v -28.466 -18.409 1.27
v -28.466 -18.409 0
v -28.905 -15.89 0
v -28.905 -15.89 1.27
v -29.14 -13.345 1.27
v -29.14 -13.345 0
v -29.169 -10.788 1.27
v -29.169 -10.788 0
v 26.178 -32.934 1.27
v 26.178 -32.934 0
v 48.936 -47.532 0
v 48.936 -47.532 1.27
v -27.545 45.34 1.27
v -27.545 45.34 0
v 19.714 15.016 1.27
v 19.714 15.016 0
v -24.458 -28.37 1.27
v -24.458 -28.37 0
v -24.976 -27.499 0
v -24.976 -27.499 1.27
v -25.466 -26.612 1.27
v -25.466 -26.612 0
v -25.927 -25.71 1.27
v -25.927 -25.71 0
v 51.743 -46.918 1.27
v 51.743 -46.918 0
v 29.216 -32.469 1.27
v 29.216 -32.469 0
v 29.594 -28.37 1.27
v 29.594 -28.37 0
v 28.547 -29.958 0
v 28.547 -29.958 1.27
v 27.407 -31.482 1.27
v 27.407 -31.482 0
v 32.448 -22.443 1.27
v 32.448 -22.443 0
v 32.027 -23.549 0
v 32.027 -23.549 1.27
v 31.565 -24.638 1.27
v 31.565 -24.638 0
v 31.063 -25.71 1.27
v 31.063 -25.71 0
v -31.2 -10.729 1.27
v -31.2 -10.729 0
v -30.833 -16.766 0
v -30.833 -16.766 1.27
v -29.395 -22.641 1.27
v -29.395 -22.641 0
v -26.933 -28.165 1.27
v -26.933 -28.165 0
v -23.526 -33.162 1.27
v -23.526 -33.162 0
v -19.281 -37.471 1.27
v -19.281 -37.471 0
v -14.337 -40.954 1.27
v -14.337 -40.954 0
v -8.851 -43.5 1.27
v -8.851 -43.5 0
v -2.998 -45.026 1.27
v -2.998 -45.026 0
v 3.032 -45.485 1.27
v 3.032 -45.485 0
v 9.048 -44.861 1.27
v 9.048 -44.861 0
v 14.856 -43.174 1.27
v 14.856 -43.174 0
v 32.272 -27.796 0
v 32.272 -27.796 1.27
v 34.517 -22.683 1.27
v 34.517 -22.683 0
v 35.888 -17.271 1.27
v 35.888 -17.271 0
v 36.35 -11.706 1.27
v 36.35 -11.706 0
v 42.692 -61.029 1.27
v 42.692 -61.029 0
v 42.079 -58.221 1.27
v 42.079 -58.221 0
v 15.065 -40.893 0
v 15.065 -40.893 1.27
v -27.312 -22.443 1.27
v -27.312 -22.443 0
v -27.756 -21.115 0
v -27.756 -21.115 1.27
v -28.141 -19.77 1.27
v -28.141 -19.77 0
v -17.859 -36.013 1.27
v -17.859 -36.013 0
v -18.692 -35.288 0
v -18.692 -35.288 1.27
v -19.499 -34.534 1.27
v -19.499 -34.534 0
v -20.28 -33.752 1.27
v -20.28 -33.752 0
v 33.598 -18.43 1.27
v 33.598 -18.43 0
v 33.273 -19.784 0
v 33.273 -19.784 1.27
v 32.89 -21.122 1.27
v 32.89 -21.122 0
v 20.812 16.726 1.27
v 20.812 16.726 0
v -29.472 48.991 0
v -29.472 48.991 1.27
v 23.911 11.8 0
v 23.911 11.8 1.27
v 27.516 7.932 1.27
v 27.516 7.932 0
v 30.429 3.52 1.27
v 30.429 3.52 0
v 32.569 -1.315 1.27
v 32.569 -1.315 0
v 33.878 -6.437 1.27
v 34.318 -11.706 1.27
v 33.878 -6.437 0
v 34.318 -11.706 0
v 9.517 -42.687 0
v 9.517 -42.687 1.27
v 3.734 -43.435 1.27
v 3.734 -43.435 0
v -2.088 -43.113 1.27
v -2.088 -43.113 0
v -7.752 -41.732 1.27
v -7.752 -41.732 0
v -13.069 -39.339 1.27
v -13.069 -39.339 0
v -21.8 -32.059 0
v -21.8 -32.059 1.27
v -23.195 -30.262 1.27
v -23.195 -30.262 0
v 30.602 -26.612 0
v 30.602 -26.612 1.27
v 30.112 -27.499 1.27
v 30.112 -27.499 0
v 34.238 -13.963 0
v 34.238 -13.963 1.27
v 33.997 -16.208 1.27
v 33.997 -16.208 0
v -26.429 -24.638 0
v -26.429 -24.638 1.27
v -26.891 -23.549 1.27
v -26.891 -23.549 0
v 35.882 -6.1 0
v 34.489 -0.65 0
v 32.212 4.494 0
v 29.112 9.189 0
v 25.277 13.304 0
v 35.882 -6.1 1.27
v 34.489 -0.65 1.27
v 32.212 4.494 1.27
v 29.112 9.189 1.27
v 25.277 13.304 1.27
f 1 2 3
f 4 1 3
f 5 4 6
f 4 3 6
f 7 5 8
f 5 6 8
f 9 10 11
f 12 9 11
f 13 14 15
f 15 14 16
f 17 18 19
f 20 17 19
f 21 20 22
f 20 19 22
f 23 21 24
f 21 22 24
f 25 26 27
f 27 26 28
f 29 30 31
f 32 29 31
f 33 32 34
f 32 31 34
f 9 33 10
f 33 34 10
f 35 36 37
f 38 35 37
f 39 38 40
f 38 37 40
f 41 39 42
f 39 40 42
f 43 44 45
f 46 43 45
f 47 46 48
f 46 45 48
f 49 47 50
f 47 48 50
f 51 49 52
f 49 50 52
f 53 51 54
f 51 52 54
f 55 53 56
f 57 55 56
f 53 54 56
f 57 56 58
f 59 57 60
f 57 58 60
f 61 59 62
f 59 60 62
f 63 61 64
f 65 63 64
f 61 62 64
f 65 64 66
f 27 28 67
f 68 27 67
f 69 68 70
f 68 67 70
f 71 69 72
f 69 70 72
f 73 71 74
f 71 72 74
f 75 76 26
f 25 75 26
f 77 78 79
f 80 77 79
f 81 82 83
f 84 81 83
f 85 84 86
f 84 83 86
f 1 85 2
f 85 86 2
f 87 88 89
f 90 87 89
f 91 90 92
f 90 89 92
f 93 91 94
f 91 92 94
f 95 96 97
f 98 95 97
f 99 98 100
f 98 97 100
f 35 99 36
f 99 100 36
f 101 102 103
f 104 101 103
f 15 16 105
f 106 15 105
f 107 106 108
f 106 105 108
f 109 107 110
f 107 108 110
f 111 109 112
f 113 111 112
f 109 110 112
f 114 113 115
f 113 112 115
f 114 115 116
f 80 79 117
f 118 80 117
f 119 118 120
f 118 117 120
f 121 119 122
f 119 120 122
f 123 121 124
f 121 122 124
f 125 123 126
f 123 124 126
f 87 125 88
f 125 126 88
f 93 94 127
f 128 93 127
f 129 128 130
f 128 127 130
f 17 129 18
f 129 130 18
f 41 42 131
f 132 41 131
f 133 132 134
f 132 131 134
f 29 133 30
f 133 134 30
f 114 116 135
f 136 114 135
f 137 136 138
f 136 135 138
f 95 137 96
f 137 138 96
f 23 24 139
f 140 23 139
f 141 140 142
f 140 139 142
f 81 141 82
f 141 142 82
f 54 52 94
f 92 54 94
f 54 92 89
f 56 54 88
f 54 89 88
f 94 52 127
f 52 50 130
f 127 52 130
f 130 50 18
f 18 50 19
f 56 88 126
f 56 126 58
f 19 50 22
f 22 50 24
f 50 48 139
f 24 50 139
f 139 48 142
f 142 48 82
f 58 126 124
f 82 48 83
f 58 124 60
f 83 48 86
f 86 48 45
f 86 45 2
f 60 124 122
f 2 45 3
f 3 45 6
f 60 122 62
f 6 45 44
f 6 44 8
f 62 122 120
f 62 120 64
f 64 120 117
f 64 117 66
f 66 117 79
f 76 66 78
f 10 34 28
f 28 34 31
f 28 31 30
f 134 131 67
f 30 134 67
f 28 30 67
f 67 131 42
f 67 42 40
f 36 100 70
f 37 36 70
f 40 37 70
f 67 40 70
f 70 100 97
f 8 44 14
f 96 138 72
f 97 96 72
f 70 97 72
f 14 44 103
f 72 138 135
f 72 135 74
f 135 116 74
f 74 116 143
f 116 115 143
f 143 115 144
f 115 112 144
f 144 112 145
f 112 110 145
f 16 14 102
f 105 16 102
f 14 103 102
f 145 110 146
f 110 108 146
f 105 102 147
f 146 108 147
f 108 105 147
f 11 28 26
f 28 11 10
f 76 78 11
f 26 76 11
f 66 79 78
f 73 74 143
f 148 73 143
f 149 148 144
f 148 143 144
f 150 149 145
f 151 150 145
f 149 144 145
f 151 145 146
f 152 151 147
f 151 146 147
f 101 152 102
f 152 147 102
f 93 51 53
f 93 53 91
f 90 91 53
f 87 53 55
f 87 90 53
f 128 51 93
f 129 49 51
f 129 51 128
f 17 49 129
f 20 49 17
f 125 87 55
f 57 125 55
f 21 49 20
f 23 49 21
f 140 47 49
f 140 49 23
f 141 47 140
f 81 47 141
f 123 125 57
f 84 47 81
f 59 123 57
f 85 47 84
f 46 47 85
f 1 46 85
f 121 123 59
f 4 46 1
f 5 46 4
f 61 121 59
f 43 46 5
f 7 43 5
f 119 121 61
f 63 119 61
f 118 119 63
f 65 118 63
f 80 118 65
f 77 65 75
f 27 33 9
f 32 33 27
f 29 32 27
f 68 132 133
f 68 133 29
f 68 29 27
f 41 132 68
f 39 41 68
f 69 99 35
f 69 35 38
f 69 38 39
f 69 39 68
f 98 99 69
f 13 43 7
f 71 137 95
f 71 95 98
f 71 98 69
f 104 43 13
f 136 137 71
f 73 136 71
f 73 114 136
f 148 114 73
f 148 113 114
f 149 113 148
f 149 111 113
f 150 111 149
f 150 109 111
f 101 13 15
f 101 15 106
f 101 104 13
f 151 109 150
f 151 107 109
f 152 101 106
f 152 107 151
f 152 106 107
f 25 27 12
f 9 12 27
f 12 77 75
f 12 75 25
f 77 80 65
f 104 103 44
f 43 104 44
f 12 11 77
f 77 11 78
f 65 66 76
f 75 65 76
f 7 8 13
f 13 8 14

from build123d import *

# Parameters (mm, degrees)
F1_DEPTH = 1.27


with BuildPart() as f1:
    # F0 (on Top) → F1 (new body)
    with BuildSketch(Plane.XY):
        with BuildLine():
            Line((20.811577, 16.726013), (-29.472172, 48.990816))
            Line((-29.472172, 48.990816), (-31.19997, -10.729261))
            ThreePointArc((-31.19997, -10.729261), (-16.887287, -39.323592), (14.856433, -43.17391))
            Line((14.856433, -43.17391), (42.692334, -61.028975))
            Line((42.692334, -61.028975), (51.743443, -46.91837))
            Line((51.743443, -46.91837), (29.216448, -32.468651))
            ThreePointArc((29.216448, -32.468651), (34.516804, -22.683067), (36.349902, -11.70622))
            ThreePointArc((36.349902, -11.70622), (32.211884, 4.494331), (20.811577, 16.726013))
        make_face()
        with BuildLine():
            Line((-29.168819, -10.788025), (-27.544949, 45.339865))
            Line((-27.544949, 45.339865), (19.714212, 15.015803))
            ThreePointArc((19.714212, 15.015803), (30.428787, 3.519862), (34.317901, -11.70622))
            ThreePointArc((34.317901, -11.70622), (34.137361, -15.0873), (33.597794, -18.429929))
            ThreePointArc((33.597794, -18.429929), (33.088689, -20.455162), (32.447555, -22.442549))
            ThreePointArc((32.447555, -22.442549), (31.800913, -24.095469), (31.062915, -25.709672))
            ThreePointArc((31.062915, -25.709672), (30.36012, -27.05728), (29.593639, -28.369712))
            ThreePointArc((29.593639, -28.369712), (27.988575, -30.728623), (26.178225, -32.933916))
            Line((26.178225, -32.933916), (48.935962, -47.531642))
            Line((48.935962, -47.531642), (42.079062, -58.221494))
            Line((42.079062, -58.221494), (15.064719, -40.893409))
            ThreePointArc((15.064719, -40.893409), (-2.08765, -43.11304), (-17.85854, -36.013071))
            ThreePointArc((-17.85854, -36.013071), (-19.098952, -34.914192), (-20.28034, -33.752089))
            ThreePointArc((-20.28034, -33.752089), (-22.513884, -31.173283), (-24.457837, -28.369712))
            ThreePointArc((-24.457837, -28.369712), (-25.224318, -27.05728), (-25.927113, -25.709672))
            ThreePointArc((-25.927113, -25.709672), (-26.665111, -24.095469), (-27.311753, -22.442549))
            ThreePointArc((-27.311753, -22.442549), (-27.955817, -20.444934), (-28.466491, -18.409131))
            ThreePointArc((-28.466491, -18.409131), (-29.04813, -14.619818), (-29.168819, -10.788025))
        make_face(mode=Mode.SUBTRACT)
    extrude(amount=F1_DEPTH)


solid = f1.part
